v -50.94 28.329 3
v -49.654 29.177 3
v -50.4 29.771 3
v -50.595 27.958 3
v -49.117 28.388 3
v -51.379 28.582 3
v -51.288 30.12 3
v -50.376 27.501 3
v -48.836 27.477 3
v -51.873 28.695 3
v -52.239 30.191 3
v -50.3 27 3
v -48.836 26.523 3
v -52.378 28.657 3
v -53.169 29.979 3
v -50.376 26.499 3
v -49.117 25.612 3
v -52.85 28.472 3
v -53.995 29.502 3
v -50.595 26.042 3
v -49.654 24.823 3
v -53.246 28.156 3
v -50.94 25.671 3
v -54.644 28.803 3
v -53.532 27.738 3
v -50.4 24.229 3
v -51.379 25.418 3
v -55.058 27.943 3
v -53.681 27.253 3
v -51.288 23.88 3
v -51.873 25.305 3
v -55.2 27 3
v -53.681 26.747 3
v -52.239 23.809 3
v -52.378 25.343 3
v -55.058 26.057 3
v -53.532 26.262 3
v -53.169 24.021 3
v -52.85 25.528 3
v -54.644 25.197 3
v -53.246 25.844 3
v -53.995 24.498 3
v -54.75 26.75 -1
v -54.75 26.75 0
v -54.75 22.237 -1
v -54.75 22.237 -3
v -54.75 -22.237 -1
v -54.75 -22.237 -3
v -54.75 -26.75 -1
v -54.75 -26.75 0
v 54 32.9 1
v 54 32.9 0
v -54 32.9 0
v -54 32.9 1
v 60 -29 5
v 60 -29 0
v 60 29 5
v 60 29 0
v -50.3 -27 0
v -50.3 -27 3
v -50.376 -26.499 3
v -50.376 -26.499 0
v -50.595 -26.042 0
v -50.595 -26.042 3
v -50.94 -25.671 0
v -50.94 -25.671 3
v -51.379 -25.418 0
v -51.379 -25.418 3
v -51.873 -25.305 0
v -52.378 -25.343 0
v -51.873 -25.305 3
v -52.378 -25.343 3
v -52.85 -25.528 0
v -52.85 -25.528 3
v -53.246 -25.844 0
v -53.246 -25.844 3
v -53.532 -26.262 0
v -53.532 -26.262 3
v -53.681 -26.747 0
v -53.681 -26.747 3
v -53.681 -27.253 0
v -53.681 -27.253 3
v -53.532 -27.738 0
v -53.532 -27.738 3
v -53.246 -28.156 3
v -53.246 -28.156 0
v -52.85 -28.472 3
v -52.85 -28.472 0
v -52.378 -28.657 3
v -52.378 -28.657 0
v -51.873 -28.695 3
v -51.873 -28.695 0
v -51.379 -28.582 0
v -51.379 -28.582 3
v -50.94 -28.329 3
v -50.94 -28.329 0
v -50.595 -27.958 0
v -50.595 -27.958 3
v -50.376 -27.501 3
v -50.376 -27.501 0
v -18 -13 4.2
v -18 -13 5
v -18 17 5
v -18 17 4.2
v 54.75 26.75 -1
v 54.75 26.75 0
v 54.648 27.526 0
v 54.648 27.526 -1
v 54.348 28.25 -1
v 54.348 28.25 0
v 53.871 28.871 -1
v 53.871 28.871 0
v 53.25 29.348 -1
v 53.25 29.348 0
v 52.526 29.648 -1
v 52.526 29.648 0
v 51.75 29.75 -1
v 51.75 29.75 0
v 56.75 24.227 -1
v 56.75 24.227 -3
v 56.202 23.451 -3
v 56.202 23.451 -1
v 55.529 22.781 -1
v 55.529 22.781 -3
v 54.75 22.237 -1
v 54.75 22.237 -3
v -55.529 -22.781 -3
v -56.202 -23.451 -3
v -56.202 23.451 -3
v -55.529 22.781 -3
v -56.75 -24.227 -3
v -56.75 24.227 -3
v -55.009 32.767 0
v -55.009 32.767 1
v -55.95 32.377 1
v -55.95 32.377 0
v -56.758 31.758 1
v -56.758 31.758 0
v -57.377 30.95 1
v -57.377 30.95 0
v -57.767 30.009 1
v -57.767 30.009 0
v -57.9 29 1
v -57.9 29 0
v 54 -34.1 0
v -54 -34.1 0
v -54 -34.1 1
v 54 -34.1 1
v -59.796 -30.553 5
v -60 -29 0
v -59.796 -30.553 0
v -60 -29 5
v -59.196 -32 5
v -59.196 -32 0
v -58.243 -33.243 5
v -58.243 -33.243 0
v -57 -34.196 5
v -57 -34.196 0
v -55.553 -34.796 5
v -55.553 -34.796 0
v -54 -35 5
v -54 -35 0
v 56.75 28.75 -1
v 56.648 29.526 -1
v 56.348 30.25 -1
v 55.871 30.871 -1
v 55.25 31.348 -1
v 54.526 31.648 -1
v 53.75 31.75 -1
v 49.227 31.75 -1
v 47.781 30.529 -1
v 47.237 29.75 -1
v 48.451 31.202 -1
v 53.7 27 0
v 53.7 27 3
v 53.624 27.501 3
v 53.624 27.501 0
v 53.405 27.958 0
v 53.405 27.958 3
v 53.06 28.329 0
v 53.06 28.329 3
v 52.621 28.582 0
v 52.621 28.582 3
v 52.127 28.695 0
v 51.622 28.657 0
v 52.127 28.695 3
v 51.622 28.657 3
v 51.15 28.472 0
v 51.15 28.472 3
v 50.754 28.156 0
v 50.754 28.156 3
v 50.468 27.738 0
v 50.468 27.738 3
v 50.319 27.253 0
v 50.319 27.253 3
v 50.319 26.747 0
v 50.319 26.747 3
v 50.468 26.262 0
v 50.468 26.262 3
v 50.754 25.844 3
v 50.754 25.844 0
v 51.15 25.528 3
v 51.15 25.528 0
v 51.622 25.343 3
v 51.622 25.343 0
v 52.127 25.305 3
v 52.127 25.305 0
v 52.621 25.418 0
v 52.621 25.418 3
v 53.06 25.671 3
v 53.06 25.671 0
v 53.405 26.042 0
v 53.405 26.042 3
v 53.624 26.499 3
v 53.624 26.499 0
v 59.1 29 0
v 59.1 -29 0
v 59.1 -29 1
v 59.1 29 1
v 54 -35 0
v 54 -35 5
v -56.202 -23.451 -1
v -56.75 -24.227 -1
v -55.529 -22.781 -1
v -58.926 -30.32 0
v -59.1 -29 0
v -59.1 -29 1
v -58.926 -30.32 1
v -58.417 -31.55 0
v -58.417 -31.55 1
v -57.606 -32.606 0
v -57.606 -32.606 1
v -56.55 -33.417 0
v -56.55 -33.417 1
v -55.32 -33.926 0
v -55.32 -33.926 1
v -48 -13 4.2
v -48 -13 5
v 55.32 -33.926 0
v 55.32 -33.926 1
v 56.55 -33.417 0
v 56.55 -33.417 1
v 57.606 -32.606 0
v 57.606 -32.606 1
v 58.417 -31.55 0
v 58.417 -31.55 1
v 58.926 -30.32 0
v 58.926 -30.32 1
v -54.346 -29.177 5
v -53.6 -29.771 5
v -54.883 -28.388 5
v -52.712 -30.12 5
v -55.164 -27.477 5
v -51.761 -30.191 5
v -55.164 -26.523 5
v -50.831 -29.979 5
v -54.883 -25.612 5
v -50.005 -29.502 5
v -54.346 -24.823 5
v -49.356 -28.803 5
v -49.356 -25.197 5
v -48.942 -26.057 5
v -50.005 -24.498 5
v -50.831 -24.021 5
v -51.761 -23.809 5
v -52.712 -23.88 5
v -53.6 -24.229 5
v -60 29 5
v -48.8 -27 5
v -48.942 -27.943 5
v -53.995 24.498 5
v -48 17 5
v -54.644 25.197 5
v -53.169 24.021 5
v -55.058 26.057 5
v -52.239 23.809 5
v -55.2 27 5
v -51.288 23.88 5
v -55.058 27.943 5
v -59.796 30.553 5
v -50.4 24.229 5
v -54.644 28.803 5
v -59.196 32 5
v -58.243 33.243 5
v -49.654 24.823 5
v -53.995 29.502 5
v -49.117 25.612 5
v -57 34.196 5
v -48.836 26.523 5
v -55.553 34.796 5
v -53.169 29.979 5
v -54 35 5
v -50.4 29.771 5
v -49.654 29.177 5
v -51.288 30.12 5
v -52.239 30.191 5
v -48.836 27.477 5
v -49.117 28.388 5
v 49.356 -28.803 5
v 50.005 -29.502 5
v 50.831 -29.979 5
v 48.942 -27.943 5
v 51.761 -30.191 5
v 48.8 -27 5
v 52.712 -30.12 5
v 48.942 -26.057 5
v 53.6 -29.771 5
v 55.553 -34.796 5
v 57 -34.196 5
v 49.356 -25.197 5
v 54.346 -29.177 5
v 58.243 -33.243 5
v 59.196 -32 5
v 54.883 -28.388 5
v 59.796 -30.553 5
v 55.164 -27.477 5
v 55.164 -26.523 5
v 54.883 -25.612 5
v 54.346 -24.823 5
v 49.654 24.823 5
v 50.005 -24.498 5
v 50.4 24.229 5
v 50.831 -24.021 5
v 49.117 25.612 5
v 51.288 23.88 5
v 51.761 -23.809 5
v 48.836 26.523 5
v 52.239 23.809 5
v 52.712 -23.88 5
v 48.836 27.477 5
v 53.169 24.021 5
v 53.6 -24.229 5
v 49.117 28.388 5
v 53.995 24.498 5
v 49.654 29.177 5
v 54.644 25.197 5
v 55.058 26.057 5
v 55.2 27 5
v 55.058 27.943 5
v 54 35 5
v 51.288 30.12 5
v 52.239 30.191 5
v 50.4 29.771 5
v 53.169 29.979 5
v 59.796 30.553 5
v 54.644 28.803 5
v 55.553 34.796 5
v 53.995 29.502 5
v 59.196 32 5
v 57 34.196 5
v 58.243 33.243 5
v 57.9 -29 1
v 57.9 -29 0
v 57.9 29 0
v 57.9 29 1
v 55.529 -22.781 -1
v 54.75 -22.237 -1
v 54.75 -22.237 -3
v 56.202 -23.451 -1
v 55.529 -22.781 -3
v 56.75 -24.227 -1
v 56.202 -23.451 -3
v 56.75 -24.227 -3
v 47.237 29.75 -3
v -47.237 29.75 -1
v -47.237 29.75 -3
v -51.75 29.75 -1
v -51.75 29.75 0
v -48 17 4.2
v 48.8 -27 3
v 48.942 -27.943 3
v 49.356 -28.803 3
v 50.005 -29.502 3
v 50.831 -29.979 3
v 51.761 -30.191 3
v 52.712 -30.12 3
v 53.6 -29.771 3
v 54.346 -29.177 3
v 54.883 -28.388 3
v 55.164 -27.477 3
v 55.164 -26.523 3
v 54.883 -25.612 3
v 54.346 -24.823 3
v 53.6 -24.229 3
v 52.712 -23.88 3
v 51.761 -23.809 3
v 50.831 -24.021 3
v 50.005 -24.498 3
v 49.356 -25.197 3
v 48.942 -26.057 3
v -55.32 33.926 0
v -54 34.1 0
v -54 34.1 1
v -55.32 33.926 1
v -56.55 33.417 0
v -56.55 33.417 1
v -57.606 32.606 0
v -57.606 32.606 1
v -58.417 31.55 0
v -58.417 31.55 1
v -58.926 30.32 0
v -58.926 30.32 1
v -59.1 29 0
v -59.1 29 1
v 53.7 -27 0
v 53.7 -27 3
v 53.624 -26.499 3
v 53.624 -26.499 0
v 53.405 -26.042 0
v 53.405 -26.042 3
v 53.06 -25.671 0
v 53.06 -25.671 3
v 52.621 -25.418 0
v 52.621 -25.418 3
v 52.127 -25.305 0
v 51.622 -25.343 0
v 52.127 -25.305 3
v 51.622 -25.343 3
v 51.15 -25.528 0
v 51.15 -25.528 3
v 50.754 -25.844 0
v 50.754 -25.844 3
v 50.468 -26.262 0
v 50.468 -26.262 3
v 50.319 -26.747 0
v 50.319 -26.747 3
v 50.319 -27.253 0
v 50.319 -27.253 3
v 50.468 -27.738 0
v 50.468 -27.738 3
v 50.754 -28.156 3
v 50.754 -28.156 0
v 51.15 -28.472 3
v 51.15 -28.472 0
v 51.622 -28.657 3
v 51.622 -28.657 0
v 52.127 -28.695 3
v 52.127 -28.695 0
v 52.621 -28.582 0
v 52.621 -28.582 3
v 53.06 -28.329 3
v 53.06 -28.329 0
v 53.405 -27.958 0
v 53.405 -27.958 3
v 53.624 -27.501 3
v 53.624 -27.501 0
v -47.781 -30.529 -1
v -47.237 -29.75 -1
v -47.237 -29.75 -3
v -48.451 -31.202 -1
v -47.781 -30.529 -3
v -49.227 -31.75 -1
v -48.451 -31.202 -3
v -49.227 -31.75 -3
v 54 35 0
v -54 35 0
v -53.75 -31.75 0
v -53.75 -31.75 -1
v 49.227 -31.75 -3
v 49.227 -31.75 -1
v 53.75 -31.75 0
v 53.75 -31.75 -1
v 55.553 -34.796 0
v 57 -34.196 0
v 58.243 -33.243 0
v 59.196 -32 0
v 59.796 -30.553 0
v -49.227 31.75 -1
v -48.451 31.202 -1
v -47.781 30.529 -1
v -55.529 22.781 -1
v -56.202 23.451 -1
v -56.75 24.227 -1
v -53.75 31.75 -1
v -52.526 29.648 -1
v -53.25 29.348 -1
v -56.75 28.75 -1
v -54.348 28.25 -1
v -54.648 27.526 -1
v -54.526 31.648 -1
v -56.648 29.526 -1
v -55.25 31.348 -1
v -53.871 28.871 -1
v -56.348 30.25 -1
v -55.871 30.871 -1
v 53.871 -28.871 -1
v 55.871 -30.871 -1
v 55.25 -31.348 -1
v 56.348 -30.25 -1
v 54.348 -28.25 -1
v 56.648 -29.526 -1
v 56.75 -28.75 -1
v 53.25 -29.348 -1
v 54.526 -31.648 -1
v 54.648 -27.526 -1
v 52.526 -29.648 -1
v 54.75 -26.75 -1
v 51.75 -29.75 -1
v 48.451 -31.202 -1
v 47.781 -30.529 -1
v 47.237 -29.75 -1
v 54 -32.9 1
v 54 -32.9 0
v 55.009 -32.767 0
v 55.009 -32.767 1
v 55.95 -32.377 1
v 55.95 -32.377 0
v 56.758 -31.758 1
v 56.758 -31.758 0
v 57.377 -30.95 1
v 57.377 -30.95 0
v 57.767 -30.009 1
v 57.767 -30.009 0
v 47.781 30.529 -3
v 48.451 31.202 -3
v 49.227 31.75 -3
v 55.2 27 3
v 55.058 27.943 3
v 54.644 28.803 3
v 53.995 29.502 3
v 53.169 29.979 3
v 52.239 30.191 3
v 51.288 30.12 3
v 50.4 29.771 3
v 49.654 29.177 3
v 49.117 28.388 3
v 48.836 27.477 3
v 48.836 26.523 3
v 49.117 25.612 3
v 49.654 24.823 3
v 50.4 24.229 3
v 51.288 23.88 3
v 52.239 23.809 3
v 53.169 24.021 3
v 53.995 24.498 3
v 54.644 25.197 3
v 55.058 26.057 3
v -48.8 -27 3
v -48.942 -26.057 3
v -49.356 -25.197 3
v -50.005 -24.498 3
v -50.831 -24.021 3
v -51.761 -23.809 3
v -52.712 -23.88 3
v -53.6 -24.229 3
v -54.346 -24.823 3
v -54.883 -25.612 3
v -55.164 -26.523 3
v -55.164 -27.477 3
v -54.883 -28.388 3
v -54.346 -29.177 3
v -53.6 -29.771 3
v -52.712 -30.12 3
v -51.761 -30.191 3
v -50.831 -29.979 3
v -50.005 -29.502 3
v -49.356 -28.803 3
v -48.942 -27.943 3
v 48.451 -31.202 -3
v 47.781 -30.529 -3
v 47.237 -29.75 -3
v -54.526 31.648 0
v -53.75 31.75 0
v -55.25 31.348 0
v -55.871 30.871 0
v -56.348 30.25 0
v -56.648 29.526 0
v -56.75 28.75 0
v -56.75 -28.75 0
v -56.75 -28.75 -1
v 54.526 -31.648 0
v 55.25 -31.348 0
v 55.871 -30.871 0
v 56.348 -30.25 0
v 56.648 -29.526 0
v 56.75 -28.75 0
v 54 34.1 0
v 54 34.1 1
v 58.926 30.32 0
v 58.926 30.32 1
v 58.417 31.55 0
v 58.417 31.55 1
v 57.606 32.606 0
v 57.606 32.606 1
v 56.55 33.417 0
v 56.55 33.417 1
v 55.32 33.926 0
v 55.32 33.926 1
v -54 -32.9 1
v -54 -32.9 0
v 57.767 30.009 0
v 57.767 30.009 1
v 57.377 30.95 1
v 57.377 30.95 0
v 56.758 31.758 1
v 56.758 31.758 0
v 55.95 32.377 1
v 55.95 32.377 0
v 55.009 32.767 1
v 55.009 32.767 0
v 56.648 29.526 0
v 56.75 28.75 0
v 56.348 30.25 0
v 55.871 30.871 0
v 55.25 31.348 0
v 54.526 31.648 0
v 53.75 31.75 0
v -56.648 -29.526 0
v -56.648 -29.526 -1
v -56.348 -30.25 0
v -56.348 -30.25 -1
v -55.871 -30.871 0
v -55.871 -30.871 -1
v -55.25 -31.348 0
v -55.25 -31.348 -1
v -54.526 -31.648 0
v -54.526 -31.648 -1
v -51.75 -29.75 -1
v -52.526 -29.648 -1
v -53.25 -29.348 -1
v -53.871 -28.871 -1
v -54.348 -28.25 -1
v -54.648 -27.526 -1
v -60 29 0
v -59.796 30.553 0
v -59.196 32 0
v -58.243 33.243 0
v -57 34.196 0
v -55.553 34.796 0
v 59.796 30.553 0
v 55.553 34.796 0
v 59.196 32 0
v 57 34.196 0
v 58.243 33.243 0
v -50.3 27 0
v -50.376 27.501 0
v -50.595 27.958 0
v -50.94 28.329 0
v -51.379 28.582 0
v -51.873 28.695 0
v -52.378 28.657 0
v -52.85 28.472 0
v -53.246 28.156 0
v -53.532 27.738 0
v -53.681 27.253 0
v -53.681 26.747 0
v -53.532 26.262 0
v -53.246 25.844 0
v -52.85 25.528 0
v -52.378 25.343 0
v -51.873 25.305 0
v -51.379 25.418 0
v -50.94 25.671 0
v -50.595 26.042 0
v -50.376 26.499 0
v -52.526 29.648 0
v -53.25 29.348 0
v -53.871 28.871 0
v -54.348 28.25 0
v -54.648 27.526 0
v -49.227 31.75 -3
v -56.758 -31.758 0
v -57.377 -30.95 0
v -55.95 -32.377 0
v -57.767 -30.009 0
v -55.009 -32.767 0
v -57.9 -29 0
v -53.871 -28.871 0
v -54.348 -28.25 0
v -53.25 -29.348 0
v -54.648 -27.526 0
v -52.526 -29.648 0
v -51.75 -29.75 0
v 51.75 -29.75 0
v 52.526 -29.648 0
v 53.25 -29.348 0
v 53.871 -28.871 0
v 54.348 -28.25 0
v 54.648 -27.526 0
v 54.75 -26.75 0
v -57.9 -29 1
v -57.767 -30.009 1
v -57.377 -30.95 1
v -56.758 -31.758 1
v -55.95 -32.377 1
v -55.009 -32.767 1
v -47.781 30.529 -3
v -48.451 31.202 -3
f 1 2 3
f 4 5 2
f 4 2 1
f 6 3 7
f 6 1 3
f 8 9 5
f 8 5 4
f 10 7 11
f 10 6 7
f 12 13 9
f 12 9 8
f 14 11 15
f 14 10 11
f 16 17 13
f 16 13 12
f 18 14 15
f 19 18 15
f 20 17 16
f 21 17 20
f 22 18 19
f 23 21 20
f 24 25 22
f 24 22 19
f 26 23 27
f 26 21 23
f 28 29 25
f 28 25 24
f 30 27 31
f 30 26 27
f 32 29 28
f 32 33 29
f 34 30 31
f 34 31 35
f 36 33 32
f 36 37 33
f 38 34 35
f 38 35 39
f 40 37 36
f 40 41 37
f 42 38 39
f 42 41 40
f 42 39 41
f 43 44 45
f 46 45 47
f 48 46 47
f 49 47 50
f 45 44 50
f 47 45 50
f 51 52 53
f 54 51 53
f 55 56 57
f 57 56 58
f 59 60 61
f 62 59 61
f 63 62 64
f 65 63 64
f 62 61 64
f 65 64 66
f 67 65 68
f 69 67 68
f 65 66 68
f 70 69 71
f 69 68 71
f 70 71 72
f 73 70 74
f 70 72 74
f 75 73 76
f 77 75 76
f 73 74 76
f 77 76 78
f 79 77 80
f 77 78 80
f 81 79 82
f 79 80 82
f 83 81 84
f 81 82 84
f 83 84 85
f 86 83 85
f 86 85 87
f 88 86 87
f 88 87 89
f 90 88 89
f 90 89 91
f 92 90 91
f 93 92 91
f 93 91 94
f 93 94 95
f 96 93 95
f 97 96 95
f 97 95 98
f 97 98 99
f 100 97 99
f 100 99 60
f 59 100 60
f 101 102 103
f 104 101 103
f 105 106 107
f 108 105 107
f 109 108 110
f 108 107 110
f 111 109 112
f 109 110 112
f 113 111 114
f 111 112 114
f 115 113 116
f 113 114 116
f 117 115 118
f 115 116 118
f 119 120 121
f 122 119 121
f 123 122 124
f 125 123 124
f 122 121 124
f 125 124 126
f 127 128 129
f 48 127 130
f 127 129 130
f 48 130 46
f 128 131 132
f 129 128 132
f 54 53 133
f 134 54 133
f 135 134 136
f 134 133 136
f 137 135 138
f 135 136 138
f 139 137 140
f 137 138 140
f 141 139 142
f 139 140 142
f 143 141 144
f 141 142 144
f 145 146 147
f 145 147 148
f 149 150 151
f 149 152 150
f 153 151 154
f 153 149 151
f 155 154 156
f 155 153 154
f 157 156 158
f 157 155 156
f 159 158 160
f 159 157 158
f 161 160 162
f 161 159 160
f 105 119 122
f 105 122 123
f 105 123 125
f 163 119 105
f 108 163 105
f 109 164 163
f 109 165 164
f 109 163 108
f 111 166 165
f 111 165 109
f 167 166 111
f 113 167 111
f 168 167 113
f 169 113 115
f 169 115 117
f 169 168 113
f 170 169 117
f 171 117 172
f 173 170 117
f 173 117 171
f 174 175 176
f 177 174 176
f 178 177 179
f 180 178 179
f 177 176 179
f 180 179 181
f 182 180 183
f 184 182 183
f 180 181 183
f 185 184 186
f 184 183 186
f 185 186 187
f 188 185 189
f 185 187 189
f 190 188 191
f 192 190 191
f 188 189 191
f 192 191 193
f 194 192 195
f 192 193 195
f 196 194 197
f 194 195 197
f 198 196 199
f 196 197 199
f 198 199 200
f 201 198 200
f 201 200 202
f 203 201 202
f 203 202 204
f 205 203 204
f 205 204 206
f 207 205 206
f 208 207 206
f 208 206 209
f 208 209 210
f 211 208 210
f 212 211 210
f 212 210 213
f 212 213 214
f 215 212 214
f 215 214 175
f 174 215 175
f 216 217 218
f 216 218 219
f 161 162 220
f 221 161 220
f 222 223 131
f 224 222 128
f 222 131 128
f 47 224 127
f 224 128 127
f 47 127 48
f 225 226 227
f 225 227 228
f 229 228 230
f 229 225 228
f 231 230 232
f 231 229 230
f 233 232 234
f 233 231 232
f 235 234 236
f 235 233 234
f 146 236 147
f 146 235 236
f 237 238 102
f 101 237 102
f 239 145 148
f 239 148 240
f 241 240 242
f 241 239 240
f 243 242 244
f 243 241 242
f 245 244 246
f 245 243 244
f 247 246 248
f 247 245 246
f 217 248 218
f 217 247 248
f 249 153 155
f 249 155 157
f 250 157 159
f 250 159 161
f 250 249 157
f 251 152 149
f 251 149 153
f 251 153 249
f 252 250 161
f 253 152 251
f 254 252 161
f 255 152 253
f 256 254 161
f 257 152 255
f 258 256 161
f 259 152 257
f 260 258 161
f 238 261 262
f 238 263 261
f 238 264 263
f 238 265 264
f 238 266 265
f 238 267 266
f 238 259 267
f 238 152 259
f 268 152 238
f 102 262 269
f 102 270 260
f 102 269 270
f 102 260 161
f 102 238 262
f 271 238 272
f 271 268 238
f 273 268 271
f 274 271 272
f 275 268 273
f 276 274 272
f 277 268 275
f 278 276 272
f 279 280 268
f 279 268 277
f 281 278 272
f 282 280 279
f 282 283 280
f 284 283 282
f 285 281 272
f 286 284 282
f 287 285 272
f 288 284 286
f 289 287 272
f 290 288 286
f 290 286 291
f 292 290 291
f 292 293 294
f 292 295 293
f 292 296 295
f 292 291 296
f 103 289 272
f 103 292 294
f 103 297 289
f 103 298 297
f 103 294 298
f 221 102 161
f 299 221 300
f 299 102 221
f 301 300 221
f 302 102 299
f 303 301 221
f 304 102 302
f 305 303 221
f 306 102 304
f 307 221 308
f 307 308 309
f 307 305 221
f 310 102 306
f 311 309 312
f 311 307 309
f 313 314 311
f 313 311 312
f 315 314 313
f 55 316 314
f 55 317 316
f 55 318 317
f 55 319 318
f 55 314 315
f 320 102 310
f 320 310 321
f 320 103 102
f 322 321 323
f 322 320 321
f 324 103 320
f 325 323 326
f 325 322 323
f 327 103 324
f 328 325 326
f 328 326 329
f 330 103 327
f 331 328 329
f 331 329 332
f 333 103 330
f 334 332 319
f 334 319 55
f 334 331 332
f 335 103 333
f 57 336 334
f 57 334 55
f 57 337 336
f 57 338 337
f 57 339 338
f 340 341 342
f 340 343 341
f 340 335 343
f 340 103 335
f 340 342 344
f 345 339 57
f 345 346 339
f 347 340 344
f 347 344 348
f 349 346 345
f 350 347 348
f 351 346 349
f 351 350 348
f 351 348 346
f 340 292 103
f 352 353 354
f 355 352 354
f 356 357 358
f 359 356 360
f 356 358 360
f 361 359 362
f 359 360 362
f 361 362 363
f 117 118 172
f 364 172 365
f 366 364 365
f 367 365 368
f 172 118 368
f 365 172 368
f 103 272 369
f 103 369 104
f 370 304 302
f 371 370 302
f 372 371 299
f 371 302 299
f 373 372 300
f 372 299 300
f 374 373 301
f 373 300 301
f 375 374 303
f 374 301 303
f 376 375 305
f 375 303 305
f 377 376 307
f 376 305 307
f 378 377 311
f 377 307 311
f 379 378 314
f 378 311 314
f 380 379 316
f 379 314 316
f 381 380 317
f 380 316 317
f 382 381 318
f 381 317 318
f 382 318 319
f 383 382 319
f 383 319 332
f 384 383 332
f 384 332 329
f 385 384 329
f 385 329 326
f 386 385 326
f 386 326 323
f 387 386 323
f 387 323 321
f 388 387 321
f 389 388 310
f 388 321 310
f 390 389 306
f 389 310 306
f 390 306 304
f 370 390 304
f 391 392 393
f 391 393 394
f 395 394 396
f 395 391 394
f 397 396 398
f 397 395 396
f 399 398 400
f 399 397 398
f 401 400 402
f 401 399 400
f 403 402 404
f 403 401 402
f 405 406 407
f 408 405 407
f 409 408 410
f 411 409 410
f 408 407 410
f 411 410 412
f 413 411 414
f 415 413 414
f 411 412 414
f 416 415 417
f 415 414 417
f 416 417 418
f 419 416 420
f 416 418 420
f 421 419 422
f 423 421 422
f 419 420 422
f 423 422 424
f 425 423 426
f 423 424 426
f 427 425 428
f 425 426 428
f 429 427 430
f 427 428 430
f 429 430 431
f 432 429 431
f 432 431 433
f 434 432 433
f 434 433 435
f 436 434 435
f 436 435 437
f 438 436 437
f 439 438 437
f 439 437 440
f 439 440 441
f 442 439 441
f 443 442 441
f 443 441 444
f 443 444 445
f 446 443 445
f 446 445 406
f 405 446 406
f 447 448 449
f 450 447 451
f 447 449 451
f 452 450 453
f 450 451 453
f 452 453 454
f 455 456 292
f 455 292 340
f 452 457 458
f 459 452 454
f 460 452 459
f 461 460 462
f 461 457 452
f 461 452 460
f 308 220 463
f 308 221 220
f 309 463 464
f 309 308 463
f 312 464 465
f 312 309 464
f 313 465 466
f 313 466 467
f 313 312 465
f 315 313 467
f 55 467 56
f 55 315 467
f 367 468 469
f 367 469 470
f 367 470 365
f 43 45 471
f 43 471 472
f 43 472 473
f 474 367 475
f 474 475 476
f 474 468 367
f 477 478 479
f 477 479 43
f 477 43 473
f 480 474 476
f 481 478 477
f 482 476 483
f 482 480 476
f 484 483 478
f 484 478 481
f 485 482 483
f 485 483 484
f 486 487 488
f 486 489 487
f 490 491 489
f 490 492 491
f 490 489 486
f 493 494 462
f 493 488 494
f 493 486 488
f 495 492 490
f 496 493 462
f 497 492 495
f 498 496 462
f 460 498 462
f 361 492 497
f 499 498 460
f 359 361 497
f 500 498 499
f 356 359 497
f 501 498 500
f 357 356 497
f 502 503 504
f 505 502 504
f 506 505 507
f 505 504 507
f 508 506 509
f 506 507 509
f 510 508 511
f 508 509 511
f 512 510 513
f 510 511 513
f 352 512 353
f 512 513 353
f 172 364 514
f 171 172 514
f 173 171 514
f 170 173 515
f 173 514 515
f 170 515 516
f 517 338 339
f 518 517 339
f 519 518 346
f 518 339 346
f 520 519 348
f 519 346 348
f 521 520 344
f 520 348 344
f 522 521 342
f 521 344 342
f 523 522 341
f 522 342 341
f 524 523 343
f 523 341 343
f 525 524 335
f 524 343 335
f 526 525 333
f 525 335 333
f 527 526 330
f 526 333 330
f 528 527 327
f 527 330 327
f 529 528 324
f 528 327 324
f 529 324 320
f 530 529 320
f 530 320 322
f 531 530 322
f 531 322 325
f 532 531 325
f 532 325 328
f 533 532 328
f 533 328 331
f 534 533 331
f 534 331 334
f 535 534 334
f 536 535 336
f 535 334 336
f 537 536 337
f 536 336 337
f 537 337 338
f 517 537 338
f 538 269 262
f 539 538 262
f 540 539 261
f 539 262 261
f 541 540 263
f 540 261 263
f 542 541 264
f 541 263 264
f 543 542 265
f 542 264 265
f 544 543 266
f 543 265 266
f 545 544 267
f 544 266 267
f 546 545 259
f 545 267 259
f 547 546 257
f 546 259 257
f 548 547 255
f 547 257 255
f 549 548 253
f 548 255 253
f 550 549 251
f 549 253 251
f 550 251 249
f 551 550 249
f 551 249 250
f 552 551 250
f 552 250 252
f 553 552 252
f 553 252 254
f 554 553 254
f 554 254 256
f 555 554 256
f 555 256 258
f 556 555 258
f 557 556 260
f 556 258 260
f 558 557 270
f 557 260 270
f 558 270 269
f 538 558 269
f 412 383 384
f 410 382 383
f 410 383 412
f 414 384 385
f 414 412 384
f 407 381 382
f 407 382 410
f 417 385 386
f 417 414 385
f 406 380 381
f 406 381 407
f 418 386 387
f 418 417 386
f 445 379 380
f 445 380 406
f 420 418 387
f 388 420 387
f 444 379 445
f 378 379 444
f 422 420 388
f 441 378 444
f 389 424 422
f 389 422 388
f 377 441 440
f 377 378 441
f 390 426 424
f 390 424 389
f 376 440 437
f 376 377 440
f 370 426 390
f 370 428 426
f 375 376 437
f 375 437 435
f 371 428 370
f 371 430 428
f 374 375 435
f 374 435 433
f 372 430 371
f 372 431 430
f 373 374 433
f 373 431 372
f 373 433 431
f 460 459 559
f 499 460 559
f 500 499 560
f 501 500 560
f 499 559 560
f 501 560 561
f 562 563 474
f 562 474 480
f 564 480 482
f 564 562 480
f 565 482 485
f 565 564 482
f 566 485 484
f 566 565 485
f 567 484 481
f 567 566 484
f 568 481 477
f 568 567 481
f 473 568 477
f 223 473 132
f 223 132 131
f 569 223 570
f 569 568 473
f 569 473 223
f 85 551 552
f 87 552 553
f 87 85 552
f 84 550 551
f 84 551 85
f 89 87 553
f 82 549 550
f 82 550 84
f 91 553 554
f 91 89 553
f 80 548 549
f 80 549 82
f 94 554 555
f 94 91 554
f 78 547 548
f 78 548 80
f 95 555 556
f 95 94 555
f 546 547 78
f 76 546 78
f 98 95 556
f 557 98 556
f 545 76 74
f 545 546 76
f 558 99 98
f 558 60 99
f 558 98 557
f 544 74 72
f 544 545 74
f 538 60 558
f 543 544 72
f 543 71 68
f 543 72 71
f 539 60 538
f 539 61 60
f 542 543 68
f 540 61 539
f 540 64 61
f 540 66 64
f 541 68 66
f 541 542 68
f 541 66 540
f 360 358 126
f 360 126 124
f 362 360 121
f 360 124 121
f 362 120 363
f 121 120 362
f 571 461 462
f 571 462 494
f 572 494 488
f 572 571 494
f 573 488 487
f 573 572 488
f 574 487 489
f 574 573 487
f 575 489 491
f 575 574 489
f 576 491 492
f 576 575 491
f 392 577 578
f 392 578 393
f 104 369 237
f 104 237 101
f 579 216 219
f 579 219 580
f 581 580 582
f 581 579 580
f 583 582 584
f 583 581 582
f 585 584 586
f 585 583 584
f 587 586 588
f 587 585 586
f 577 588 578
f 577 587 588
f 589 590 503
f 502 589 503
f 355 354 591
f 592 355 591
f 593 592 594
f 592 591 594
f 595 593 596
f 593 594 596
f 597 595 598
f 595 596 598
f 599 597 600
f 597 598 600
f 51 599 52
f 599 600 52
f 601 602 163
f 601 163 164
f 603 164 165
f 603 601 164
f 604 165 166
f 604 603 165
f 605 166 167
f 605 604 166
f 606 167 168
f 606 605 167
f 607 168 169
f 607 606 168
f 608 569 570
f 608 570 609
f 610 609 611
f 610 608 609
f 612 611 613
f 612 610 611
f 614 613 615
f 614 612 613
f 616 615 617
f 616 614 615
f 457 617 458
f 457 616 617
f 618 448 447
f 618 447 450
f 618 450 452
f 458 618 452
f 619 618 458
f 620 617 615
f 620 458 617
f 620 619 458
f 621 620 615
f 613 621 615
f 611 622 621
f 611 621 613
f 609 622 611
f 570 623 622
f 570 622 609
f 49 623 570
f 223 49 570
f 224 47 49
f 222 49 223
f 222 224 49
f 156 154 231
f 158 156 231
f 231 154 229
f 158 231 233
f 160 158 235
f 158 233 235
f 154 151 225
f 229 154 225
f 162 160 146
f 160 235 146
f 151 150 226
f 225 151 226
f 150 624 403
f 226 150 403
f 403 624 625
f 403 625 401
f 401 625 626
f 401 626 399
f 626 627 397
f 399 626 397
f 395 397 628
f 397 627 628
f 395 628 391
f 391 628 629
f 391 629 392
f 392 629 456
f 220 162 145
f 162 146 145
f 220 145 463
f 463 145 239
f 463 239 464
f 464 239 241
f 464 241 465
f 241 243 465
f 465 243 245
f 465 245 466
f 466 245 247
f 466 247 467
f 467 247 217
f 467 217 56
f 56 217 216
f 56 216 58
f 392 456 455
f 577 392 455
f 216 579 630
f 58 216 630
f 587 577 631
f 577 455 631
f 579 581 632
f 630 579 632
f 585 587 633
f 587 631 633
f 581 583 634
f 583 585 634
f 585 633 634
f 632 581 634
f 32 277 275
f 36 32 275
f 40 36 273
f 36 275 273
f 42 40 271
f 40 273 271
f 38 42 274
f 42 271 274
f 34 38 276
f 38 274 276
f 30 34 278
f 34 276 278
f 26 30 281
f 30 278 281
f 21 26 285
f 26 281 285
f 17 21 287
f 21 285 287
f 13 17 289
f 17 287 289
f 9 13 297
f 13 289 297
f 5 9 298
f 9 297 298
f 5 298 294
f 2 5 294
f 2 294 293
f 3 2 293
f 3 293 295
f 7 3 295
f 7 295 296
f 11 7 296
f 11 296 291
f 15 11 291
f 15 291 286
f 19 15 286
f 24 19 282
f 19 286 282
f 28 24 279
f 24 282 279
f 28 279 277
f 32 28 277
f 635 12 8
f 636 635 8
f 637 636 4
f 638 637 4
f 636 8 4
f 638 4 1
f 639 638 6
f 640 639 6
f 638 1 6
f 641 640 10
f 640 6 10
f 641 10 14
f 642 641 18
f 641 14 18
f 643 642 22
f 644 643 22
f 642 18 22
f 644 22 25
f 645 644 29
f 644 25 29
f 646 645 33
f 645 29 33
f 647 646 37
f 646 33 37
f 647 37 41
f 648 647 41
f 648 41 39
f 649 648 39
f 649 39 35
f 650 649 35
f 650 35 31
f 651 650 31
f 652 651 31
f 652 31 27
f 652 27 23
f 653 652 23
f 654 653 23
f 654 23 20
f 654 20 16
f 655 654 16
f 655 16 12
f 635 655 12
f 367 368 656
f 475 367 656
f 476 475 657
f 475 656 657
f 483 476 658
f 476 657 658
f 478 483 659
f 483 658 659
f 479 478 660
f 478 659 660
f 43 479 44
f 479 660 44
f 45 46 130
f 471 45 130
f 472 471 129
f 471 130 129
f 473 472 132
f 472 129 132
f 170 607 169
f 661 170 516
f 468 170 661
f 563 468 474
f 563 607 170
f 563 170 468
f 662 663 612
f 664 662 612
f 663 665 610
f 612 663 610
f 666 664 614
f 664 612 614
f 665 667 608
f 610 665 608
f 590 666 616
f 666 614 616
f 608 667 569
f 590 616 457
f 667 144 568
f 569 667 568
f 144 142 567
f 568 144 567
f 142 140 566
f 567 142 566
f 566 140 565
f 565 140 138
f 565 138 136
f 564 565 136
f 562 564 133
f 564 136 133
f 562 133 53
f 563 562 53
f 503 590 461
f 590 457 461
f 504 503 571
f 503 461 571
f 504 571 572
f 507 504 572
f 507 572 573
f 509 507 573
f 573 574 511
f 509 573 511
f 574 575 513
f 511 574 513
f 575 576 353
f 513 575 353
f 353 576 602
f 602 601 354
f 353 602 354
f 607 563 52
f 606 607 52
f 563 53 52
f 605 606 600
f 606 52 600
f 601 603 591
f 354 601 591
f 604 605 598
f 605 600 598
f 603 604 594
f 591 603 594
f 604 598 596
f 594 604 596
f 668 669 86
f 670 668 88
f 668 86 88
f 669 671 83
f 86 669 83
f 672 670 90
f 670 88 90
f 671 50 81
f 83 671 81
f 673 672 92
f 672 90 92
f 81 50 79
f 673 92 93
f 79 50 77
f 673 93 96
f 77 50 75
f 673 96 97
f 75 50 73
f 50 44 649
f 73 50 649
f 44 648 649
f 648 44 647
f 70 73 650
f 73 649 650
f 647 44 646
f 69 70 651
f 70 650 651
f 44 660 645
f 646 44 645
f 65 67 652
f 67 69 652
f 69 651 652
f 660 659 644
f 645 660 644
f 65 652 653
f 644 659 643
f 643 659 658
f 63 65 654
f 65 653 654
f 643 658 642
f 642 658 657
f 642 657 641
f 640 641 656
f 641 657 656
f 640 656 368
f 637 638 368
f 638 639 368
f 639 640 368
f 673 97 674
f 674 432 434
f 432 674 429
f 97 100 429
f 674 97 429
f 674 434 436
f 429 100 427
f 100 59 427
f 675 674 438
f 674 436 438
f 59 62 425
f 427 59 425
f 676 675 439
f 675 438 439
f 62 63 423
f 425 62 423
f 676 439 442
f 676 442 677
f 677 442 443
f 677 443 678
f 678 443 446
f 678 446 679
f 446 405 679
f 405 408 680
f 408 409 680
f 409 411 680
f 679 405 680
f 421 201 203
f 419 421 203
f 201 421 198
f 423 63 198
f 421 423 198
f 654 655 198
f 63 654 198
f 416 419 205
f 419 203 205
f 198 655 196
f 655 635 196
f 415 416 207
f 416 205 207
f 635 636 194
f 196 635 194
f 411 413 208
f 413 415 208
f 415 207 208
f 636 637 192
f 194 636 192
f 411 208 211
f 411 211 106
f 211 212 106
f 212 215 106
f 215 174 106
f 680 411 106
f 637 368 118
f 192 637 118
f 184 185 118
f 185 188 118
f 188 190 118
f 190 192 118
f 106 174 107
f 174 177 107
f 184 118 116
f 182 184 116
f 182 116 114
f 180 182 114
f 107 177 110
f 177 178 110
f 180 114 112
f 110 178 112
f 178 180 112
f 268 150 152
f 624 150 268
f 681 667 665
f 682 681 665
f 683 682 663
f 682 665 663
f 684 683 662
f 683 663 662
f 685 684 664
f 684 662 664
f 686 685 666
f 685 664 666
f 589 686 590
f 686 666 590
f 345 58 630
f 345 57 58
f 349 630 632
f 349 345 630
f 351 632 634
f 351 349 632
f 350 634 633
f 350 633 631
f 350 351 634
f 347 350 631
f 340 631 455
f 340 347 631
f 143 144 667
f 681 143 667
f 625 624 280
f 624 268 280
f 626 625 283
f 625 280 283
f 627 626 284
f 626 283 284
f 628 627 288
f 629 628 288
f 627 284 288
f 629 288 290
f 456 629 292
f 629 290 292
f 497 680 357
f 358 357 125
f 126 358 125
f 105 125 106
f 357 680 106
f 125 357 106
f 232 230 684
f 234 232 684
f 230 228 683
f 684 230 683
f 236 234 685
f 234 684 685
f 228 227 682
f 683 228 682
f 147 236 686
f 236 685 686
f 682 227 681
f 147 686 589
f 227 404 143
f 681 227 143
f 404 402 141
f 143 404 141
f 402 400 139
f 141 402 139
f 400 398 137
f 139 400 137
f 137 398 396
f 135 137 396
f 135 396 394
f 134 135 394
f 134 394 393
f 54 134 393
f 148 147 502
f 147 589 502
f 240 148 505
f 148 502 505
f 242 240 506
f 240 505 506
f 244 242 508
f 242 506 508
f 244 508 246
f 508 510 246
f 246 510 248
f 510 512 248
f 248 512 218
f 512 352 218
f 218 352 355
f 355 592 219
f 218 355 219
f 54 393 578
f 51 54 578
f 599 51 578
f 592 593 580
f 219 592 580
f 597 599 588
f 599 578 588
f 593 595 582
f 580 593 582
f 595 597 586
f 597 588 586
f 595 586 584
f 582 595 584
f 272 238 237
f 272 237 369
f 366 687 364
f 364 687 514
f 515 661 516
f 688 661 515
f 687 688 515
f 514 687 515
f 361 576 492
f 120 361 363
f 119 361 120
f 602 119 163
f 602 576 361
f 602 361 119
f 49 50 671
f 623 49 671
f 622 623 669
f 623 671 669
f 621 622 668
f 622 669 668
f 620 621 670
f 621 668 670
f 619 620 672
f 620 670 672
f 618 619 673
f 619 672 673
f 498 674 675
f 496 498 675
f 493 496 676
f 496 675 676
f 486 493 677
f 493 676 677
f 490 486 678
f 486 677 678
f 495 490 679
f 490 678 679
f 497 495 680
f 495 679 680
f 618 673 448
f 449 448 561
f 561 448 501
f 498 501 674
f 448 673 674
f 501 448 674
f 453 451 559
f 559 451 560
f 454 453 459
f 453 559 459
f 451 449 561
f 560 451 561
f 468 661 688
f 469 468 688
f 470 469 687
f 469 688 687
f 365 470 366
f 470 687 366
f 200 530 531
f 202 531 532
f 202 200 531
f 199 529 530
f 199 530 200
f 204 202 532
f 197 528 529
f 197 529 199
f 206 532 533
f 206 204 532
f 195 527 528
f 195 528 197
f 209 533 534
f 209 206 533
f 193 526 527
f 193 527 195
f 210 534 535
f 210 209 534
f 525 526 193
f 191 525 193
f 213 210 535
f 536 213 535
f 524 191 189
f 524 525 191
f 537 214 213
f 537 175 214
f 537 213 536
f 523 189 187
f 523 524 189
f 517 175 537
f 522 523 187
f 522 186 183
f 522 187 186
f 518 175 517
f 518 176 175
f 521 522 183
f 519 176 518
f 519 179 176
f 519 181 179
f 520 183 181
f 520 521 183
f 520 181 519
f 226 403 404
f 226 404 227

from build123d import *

# Parameters (mm, degrees)
SKETCH1_W           = 120
SKETCH1_H           = 70
BOSS_EXTRUDE1_DEPTH = 5
FILLET1_R           = 6
BOSS_EXTRUDE2_DEPTH = 3
SKETCH3_R           = 5.5
CUT_EXTRUDE1_DEPTH  = 2
SKETCH4_R           = 3.2
CUT_EXTRUDE2_DEPTH  = 2
SKETCH5_R           = 1.7
CUT_EXTRUDE3_DEPTH  = 70.720872054
CUT_EXTRUDE4_DEPTH  = 1
SKETCH7_W           = 30
SKETCH7_H           = 30
CUT_EXTRUDE5_DEPTH  = 0.8


with BuildPart() as part:
    # Sketch1 → Boss-Extrude1 (new body)
    with BuildSketch(Plane.XY):
        Rectangle(SKETCH1_W, SKETCH1_H)
    extrude(amount=BOSS_EXTRUDE1_DEPTH)

    # Fillet1
    fillet1_edges = [part.edges().sort_by_distance(p)[0] for p in [
        (-60, 35, 2.5),
        (60, 35, 2.5),
        (60, -35, 2.5),
        (-60, -35, 2.5),
    ]]
    fillet(fillet1_edges, radius=FILLET1_R)

    # Sketch2 → Boss-Extrude2 (add)
    with BuildSketch(Plane(origin=(0, 0, 0), x_dir=(-1, 0, 0), z_dir=(0, 0, -1))):
        with BuildLine():
            Line((-53.75, 31.75), (53.75, 31.75))
            ThreePointArc((53.75, 31.75), (55.871320344, 30.871320344), (56.75, 28.75))
            Line((56.75, 28.75), (56.75, -28.75))
            ThreePointArc((56.75, -28.75), (55.871320344, -30.871320344), (53.75, -31.75))
            Line((53.75, -31.75), (-53.75, -31.75))
            ThreePointArc((-53.75, -31.75), (-55.871320344, -30.871320344), (-56.75, -28.75))
            Line((-56.75, -28.75), (-56.75, 28.75))
            ThreePointArc((-56.75, 28.75), (-55.871320344, 30.871320344), (-53.75, 31.75))
        make_face()
        with BuildLine():
            Line((-51.75, 29.75), (51.75, 29.75))
            ThreePointArc((51.75, 29.75), (53.871320344, 28.871320344), (54.75, 26.75))
            Line((54.75, 26.75), (54.75, -26.75))
            ThreePointArc((54.75, -26.75), (53.871320344, -28.871320344), (51.75, -29.75))
            Line((51.75, -29.75), (-51.75, -29.75))
            ThreePointArc((-51.75, -29.75), (-53.871320344, -28.871320344), (-54.75, -26.75))
            Line((-54.75, -26.75), (-54.75, 26.75))
            ThreePointArc((-54.75, 26.75), (-53.871320344, 28.871320344), (-51.75, 29.75))
        make_face(mode=Mode.SUBTRACT)
    extrude(amount=BOSS_EXTRUDE2_DEPTH)

    # Sketch3 → Cut-Extrude1 (cut)
    with BuildSketch(Plane(origin=(0, 0, -3), x_dir=(-1, 0, 0), z_dir=(0, 0, -1))):
        with Locations((-52, 27)):
            Circle(SKETCH3_R)
        with Locations((-52, -27)):
            Circle(SKETCH3_R)
        with Locations((52, -27)):
            Circle(SKETCH3_R)
        with Locations((52, 27)):
            Circle(SKETCH3_R)
    extrude(amount=-CUT_EXTRUDE1_DEPTH, mode=Mode.SUBTRACT)

    # Sketch4 → Cut-Extrude2 (cut)
    with BuildSketch(Plane.XY.offset(5)):
        with Locations((52, 27)):
            Circle(SKETCH4_R)
        with Locations(Location((52, -27, 0), (0, 0, 180))):
            Circle(SKETCH4_R)
        with Locations((-52, -27)):
            Circle(SKETCH4_R)
        with Locations(Location((-52, 27, 0), (0, 0, 180))):
            Circle(SKETCH4_R)
    extrude(amount=-CUT_EXTRUDE2_DEPTH, mode=Mode.SUBTRACT)

    # Sketch5 → Cut-Extrude3 (cut, through all)
    with BuildSketch(Plane.XY.offset(3)):
        with Locations((52, 27)):
            Circle(SKETCH5_R)
        with Locations((52, -27)):
            Circle(SKETCH5_R)
        with Locations((-52, -27)):
            Circle(SKETCH5_R)
        with Locations((-52, 27)):
            Circle(SKETCH5_R)
    extrude(amount=-CUT_EXTRUDE3_DEPTH, mode=Mode.SUBTRACT)

    # Sketch6 → Cut-Extrude4 (cut)
    with BuildSketch(Plane(origin=(0, 0, 0), x_dir=(-1, 0, 0), z_dir=(0, 0, -1))):
        with BuildLine():
            Line((-54, 34.1), (54, 34.1))
            ThreePointArc((54, 34.1), (57.606244584, 32.606244584), (59.1, 29))
            Line((59.1, 29), (59.1, -29))
            ThreePointArc((59.1, -29), (57.606244584, -32.606244584), (54, -34.1))
            Line((54, -34.1), (-54, -34.1))
            ThreePointArc((-54, -34.1), (-57.606244584, -32.606244584), (-59.1, -29))
            Line((-59.1, -29), (-59.1, 29))
            ThreePointArc((-59.1, 29), (-57.606244584, 32.606244584), (-54, 34.1))
        make_face()
        with BuildLine():
            Line((-54, 32.9), (54, 32.9))
            ThreePointArc((54, 32.9), (56.757716447, 31.757716447), (57.9, 29))
            Line((57.9, 29), (57.9, -29))
            ThreePointArc((57.9, -29), (56.757716447, -31.757716447), (54, -32.9))
            Line((54, -32.9), (-54, -32.9))
            ThreePointArc((-54, -32.9), (-56.757716447, -31.757716447), (-57.9, -29))
            Line((-57.9, -29), (-57.9, 29))
            ThreePointArc((-57.9, 29), (-56.757716447, 31.757716447), (-54, 32.9))
        make_face(mode=Mode.SUBTRACT)
    extrude(amount=-CUT_EXTRUDE4_DEPTH, mode=Mode.SUBTRACT)

    # Sketch7 → Cut-Extrude5 (cut)
    with BuildSketch(Plane.XY.offset(5)):
        with Locations((-33, 2)):
            Rectangle(SKETCH7_W, SKETCH7_H)
    extrude(amount=-CUT_EXTRUDE5_DEPTH, mode=Mode.SUBTRACT)


solid = part.part
